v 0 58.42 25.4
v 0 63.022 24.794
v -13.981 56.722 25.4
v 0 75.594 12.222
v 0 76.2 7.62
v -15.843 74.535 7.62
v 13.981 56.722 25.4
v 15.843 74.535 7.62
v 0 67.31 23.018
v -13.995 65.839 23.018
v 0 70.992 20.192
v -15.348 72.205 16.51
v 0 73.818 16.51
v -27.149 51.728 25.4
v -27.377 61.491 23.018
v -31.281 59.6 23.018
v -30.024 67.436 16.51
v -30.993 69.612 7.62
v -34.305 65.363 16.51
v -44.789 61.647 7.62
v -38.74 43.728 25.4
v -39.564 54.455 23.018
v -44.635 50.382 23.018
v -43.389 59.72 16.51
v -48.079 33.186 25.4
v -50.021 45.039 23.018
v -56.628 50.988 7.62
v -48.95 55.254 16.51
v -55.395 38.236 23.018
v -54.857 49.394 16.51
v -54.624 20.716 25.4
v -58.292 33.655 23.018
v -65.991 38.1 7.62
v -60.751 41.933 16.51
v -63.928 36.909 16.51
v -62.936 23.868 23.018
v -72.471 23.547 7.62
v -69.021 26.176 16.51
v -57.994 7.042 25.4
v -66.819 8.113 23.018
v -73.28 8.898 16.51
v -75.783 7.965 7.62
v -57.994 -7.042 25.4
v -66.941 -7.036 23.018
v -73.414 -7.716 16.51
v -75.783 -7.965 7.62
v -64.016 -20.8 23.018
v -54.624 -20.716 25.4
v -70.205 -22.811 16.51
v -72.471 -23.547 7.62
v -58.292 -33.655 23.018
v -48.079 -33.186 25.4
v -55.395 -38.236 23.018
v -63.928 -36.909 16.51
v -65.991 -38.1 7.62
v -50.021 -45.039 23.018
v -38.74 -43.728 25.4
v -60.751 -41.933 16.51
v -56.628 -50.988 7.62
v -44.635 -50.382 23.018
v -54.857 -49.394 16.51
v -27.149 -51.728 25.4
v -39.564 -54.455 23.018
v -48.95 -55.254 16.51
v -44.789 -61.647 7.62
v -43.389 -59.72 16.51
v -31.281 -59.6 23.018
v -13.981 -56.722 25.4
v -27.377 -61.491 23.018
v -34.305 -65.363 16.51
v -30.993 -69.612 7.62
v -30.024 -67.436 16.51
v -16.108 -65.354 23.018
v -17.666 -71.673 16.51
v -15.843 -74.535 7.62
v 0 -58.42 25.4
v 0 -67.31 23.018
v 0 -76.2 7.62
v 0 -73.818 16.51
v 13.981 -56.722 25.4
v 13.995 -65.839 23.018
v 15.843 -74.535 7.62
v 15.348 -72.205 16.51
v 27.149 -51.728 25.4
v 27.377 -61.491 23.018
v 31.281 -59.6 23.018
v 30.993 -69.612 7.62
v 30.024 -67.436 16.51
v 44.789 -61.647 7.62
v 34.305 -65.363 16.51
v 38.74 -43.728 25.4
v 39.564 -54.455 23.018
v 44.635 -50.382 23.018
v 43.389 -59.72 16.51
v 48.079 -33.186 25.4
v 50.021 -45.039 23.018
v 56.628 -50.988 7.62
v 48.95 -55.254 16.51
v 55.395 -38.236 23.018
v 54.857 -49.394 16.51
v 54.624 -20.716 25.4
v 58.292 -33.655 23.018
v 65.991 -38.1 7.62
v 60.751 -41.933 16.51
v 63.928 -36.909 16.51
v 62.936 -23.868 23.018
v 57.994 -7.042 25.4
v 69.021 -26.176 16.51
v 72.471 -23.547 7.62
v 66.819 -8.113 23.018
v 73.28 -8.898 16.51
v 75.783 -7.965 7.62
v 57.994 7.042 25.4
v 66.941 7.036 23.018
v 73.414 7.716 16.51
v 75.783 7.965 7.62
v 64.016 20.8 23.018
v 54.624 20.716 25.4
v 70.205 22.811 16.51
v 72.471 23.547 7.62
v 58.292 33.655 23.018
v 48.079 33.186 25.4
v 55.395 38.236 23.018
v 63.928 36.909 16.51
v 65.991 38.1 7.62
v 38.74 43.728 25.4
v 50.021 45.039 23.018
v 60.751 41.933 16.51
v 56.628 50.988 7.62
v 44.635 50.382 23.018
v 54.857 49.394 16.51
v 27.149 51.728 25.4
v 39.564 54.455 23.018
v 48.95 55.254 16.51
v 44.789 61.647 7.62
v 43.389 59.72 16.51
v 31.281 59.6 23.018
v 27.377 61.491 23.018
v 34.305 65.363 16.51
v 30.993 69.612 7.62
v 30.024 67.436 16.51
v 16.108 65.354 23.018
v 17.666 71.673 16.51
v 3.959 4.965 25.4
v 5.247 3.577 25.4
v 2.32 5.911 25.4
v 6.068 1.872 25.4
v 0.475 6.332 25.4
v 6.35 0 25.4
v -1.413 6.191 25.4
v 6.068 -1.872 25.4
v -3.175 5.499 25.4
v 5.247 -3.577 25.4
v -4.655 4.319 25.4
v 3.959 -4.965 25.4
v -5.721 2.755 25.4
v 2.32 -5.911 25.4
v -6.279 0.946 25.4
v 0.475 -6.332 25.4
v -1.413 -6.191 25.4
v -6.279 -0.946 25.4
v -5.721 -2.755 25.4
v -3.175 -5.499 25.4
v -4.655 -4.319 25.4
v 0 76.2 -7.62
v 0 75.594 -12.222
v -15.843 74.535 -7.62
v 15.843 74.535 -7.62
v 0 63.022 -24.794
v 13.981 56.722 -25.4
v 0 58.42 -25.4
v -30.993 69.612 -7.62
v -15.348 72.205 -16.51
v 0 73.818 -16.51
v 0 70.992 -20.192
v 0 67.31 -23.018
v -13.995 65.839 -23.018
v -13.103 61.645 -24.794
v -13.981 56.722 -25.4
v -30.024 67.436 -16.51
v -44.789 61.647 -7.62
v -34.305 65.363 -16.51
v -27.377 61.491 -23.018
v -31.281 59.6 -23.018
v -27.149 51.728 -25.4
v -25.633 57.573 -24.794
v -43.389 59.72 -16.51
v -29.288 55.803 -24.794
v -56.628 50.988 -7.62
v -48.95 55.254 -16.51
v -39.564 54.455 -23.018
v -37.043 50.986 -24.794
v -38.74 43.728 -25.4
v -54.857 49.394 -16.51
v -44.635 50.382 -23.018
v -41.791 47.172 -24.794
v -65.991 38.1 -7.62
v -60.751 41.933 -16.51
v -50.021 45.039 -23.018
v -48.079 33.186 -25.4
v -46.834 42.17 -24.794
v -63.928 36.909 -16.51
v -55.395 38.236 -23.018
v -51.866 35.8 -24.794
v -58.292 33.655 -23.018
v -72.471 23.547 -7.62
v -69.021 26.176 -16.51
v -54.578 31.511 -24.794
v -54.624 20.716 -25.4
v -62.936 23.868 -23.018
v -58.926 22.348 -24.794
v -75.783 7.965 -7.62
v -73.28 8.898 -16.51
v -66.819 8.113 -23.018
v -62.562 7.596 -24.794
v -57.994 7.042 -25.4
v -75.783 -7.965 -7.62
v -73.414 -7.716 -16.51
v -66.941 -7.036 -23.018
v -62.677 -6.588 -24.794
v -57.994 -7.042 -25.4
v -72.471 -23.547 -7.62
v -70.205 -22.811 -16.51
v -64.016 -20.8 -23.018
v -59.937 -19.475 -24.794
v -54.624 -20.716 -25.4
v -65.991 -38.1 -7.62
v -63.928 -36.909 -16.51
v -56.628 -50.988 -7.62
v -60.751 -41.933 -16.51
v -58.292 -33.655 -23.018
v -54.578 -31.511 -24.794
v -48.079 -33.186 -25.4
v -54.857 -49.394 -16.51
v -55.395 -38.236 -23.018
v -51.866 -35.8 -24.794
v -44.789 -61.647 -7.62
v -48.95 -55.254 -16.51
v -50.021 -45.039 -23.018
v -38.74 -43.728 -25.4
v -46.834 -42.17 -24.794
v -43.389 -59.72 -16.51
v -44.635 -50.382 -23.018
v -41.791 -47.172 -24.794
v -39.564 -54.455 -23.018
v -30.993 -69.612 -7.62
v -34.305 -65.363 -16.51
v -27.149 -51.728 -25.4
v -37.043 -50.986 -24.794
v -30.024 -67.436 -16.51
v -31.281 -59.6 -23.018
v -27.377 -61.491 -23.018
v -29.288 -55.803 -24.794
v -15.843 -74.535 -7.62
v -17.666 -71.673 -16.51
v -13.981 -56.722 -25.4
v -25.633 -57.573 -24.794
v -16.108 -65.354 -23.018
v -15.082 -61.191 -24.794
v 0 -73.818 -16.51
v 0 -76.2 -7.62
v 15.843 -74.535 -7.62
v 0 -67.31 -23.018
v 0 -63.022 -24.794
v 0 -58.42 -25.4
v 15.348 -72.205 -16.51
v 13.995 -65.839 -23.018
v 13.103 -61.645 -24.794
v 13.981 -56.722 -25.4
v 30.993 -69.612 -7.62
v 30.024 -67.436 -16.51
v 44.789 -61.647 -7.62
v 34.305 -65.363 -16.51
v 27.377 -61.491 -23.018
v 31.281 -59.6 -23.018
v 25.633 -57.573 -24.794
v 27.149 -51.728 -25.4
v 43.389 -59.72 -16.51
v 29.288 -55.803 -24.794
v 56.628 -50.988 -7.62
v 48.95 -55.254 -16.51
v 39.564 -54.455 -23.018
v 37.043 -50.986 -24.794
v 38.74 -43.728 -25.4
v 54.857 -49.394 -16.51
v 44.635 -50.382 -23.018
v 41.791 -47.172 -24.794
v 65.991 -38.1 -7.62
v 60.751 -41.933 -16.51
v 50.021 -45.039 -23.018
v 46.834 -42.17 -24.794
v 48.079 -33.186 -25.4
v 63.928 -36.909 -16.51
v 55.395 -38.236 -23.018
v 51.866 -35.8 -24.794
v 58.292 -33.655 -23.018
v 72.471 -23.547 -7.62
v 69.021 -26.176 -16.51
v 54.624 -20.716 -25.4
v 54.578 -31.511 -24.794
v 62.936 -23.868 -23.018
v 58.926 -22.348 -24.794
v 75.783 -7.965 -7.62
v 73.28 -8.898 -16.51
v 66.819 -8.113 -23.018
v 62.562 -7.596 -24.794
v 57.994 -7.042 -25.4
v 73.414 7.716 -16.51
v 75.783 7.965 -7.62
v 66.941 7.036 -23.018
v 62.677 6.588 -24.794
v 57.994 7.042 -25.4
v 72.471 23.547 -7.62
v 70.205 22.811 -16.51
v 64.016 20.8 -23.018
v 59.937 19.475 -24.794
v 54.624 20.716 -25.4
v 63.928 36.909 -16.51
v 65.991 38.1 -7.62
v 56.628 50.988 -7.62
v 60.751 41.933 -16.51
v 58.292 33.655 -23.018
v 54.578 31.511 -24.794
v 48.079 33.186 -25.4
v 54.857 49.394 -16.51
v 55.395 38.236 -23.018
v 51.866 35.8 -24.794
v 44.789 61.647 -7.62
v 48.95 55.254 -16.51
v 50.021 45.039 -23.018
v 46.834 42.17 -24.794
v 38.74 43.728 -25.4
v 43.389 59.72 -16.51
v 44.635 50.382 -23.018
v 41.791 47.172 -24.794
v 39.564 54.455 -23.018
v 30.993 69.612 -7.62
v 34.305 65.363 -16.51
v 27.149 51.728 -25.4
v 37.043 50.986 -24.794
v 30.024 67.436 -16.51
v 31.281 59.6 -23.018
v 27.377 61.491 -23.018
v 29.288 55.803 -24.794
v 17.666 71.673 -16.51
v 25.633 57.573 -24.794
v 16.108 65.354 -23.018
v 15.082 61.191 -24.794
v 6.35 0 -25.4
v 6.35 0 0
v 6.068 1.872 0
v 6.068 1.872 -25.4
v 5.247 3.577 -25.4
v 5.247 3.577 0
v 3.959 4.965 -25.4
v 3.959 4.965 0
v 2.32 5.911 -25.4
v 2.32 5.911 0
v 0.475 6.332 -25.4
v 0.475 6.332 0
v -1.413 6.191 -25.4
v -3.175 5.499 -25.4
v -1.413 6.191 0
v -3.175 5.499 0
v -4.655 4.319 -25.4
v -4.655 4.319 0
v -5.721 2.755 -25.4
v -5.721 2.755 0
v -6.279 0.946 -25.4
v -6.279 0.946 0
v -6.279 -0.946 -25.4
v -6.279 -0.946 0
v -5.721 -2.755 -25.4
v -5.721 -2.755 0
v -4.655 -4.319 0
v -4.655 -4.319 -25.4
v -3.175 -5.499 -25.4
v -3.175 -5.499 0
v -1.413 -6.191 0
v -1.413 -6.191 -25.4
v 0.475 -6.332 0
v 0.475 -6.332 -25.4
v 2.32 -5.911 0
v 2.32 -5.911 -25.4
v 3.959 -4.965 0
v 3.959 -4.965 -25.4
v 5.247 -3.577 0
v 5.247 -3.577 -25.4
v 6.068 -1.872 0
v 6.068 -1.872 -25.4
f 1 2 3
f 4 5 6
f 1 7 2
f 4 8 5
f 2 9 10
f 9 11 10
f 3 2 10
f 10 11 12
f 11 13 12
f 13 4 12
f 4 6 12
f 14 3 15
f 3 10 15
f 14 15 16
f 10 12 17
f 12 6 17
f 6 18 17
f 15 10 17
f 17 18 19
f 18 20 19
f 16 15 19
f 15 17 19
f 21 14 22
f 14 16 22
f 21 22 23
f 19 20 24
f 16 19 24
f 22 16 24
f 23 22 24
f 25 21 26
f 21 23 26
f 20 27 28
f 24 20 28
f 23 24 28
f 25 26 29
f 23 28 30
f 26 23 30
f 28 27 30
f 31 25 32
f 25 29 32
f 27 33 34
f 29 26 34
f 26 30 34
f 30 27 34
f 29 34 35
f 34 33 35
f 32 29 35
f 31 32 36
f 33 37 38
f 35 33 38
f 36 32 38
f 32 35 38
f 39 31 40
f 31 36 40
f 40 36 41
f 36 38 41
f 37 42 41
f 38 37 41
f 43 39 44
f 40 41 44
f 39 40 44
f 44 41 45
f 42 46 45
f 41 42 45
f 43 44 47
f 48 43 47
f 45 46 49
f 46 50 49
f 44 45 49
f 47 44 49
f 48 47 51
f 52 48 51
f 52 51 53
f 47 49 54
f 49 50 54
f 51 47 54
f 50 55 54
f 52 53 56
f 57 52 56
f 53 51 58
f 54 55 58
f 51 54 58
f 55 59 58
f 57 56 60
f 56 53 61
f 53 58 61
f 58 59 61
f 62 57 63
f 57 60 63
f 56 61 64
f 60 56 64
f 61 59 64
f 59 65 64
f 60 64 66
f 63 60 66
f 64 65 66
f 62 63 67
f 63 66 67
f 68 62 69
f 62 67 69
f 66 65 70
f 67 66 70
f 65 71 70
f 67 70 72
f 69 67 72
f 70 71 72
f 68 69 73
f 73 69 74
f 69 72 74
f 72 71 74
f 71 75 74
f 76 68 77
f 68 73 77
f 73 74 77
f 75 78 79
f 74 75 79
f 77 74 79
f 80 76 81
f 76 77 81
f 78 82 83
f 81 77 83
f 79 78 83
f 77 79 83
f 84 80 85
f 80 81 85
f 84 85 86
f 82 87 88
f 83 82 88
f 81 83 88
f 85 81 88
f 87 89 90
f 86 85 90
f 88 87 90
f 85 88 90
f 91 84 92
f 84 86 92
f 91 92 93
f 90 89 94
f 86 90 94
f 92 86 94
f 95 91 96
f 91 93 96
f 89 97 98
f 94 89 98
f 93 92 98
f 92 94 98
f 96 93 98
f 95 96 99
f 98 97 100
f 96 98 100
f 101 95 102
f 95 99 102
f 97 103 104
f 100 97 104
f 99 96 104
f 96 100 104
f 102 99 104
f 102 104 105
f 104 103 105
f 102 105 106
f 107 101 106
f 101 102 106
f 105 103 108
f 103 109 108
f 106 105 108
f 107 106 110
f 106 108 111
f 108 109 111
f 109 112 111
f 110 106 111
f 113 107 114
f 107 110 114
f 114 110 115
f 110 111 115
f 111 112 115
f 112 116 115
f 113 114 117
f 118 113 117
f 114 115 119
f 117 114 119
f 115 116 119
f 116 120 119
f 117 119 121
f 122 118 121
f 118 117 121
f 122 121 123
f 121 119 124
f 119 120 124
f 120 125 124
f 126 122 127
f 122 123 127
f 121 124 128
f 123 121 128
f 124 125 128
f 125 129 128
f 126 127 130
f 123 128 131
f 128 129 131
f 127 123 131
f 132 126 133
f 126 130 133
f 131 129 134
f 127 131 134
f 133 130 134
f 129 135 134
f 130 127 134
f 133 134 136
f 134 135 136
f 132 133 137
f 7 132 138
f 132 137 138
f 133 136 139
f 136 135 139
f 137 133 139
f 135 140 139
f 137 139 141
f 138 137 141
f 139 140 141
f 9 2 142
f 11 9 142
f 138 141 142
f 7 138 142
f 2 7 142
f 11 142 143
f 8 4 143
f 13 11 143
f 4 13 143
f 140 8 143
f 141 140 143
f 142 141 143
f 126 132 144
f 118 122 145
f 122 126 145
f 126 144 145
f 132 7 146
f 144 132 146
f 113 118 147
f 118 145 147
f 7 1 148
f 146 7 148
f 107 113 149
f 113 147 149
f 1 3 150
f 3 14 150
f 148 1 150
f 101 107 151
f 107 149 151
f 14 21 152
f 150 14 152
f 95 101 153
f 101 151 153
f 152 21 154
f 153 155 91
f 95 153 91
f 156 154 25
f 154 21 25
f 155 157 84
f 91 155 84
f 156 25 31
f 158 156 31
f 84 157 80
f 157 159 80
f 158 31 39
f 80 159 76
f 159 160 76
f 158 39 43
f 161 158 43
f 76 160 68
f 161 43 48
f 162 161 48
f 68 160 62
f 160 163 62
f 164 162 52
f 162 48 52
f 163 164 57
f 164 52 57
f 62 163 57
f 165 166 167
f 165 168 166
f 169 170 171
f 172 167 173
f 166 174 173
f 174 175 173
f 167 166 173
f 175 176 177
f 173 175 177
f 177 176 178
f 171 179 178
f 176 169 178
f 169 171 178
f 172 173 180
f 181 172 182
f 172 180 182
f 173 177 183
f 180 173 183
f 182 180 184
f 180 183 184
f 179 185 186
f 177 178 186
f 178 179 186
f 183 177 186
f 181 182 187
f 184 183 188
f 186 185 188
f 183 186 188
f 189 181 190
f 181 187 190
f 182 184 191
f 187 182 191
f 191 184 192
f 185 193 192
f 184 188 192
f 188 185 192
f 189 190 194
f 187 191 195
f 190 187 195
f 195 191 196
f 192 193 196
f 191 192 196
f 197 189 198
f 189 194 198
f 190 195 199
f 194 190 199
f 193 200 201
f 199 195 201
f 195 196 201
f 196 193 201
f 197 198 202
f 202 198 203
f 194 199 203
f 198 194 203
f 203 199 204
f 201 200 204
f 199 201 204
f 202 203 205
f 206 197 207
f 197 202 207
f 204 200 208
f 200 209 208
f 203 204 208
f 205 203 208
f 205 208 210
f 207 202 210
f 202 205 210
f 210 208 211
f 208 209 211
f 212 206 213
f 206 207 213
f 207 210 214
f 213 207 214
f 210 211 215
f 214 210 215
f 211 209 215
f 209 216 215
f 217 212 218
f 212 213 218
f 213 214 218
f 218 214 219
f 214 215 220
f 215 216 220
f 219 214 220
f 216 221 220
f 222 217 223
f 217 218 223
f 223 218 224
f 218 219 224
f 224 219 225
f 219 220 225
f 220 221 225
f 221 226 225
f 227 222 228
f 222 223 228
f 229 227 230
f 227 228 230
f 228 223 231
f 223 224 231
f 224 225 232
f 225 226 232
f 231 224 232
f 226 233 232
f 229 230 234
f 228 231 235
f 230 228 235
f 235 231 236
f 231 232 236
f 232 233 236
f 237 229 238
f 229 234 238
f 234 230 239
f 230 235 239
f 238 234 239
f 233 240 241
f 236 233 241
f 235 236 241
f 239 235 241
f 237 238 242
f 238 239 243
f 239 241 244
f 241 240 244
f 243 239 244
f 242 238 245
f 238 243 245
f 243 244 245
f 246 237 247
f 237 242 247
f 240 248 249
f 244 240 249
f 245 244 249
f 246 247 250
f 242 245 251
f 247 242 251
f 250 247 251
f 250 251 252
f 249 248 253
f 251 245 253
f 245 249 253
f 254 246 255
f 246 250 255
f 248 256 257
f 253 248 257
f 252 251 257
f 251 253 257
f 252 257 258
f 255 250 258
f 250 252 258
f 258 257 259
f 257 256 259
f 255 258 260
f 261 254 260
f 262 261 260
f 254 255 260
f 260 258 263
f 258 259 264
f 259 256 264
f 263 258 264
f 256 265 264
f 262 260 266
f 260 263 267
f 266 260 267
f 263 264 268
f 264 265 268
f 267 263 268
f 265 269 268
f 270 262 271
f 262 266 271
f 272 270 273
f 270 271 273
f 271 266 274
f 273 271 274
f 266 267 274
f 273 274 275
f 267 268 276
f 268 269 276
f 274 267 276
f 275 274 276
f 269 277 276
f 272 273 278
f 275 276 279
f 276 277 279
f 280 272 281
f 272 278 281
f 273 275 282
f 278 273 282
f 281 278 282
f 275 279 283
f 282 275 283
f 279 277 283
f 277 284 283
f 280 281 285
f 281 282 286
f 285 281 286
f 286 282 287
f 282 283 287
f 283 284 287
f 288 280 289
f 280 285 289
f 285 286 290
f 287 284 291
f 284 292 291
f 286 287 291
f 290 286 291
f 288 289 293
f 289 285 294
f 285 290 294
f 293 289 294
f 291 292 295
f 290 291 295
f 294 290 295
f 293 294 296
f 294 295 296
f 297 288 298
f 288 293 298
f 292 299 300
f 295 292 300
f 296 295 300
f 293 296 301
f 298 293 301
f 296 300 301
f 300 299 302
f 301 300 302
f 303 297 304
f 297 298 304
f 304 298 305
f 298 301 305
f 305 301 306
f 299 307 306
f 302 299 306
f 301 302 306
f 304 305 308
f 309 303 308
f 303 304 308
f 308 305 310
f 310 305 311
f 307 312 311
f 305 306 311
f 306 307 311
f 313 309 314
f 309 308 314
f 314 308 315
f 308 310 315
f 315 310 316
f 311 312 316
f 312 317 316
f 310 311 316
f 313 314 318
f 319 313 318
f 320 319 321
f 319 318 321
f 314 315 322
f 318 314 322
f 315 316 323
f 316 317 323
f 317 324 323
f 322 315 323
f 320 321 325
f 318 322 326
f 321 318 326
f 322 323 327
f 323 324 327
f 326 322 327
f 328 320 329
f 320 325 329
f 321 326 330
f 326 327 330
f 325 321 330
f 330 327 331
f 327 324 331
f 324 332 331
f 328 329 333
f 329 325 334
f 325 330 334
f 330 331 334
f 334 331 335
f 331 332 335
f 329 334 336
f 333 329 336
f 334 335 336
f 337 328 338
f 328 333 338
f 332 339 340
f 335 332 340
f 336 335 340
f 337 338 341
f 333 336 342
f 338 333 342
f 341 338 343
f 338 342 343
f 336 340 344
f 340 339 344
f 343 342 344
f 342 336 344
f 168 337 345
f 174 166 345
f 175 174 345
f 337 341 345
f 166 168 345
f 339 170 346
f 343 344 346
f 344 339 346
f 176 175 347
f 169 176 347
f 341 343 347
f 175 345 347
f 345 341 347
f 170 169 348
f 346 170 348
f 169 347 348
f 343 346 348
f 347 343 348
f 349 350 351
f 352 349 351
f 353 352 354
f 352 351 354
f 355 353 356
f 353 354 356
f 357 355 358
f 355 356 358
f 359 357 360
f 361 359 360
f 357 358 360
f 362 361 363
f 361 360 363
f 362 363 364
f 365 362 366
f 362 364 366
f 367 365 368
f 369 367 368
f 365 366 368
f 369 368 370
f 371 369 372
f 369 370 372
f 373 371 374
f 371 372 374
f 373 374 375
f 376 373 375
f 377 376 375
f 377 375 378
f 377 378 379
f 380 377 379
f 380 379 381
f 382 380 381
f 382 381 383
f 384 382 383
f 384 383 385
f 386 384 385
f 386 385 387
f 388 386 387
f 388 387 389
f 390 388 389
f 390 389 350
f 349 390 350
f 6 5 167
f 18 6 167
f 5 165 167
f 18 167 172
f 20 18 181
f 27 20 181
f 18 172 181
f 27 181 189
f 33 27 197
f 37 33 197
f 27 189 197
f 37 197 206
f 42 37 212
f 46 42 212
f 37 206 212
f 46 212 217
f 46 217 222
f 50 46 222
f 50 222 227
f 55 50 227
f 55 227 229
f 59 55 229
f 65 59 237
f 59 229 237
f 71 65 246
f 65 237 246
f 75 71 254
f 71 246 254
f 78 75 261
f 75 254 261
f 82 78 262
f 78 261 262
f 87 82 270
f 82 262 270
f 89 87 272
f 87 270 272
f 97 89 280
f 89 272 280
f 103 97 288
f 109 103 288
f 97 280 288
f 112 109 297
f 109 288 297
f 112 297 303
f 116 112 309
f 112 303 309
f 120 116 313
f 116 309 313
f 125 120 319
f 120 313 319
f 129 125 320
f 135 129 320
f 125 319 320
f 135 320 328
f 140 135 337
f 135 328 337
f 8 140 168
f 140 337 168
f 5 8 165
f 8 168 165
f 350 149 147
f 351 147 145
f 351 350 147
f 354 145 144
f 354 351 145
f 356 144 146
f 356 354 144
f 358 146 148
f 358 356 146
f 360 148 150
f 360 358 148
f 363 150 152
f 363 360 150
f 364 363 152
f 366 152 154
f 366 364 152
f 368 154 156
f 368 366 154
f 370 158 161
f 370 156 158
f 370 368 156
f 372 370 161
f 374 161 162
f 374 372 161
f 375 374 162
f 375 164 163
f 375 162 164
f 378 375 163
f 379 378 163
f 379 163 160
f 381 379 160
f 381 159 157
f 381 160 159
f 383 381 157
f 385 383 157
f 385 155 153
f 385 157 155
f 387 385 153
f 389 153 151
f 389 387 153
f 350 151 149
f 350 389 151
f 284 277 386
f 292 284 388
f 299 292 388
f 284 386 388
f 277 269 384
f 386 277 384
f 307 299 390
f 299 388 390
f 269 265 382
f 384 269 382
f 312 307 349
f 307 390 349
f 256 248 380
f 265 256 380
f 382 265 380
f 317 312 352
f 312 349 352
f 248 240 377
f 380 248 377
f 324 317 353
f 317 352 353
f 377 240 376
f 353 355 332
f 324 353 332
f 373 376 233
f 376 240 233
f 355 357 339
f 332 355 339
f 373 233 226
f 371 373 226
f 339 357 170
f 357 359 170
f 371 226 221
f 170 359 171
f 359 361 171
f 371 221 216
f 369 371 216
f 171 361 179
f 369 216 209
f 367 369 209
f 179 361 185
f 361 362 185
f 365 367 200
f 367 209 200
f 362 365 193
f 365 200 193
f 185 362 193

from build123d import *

# Parameters (mm, degrees)
SKETCH2_R               = 6.35
CUT_EXTRUDE1_DEPTH      = 108.458
CUT_EXTRUDE1_DEPTH_BACK = 134.62


with BuildPart() as part:
    # Sketch1 → Revolve2 (revolve)
    with BuildSketch(Plane(origin=(0, 0, 0), x_dir=(0, 0, -1), z_dir=(1, 0, 0))):
        with BuildLine():
            Line((-25.4, 0), (-25.4, 58.42))
            ThreePointArc((-25.4, 58.42), (-20.192358569, 70.992358569), (-7.62, 76.2))
            Line((-7.62, 76.2), (7.62, 76.2))
            ThreePointArc((7.62, 76.2), (20.192358569, 70.992358569), (25.4, 58.42))
            Line((25.4, 58.42), (25.4, 0))
            Line((25.4, 0), (-25.4, 0))
        make_face()
    revolve(axis=Axis((0, 0, -37.220072608), (0, 0, 1)))

    # Sketch2 → Cut-Extrude1 (cut, two sides)
    with BuildSketch(Plane.XY) as cut_extrude1_sk:
        Circle(SKETCH2_R)
    extrude(amount=CUT_EXTRUDE1_DEPTH, mode=Mode.SUBTRACT)
    extrude(cut_extrude1_sk.sketch, amount=-CUT_EXTRUDE1_DEPTH_BACK, mode=Mode.SUBTRACT)


solid = part.part
